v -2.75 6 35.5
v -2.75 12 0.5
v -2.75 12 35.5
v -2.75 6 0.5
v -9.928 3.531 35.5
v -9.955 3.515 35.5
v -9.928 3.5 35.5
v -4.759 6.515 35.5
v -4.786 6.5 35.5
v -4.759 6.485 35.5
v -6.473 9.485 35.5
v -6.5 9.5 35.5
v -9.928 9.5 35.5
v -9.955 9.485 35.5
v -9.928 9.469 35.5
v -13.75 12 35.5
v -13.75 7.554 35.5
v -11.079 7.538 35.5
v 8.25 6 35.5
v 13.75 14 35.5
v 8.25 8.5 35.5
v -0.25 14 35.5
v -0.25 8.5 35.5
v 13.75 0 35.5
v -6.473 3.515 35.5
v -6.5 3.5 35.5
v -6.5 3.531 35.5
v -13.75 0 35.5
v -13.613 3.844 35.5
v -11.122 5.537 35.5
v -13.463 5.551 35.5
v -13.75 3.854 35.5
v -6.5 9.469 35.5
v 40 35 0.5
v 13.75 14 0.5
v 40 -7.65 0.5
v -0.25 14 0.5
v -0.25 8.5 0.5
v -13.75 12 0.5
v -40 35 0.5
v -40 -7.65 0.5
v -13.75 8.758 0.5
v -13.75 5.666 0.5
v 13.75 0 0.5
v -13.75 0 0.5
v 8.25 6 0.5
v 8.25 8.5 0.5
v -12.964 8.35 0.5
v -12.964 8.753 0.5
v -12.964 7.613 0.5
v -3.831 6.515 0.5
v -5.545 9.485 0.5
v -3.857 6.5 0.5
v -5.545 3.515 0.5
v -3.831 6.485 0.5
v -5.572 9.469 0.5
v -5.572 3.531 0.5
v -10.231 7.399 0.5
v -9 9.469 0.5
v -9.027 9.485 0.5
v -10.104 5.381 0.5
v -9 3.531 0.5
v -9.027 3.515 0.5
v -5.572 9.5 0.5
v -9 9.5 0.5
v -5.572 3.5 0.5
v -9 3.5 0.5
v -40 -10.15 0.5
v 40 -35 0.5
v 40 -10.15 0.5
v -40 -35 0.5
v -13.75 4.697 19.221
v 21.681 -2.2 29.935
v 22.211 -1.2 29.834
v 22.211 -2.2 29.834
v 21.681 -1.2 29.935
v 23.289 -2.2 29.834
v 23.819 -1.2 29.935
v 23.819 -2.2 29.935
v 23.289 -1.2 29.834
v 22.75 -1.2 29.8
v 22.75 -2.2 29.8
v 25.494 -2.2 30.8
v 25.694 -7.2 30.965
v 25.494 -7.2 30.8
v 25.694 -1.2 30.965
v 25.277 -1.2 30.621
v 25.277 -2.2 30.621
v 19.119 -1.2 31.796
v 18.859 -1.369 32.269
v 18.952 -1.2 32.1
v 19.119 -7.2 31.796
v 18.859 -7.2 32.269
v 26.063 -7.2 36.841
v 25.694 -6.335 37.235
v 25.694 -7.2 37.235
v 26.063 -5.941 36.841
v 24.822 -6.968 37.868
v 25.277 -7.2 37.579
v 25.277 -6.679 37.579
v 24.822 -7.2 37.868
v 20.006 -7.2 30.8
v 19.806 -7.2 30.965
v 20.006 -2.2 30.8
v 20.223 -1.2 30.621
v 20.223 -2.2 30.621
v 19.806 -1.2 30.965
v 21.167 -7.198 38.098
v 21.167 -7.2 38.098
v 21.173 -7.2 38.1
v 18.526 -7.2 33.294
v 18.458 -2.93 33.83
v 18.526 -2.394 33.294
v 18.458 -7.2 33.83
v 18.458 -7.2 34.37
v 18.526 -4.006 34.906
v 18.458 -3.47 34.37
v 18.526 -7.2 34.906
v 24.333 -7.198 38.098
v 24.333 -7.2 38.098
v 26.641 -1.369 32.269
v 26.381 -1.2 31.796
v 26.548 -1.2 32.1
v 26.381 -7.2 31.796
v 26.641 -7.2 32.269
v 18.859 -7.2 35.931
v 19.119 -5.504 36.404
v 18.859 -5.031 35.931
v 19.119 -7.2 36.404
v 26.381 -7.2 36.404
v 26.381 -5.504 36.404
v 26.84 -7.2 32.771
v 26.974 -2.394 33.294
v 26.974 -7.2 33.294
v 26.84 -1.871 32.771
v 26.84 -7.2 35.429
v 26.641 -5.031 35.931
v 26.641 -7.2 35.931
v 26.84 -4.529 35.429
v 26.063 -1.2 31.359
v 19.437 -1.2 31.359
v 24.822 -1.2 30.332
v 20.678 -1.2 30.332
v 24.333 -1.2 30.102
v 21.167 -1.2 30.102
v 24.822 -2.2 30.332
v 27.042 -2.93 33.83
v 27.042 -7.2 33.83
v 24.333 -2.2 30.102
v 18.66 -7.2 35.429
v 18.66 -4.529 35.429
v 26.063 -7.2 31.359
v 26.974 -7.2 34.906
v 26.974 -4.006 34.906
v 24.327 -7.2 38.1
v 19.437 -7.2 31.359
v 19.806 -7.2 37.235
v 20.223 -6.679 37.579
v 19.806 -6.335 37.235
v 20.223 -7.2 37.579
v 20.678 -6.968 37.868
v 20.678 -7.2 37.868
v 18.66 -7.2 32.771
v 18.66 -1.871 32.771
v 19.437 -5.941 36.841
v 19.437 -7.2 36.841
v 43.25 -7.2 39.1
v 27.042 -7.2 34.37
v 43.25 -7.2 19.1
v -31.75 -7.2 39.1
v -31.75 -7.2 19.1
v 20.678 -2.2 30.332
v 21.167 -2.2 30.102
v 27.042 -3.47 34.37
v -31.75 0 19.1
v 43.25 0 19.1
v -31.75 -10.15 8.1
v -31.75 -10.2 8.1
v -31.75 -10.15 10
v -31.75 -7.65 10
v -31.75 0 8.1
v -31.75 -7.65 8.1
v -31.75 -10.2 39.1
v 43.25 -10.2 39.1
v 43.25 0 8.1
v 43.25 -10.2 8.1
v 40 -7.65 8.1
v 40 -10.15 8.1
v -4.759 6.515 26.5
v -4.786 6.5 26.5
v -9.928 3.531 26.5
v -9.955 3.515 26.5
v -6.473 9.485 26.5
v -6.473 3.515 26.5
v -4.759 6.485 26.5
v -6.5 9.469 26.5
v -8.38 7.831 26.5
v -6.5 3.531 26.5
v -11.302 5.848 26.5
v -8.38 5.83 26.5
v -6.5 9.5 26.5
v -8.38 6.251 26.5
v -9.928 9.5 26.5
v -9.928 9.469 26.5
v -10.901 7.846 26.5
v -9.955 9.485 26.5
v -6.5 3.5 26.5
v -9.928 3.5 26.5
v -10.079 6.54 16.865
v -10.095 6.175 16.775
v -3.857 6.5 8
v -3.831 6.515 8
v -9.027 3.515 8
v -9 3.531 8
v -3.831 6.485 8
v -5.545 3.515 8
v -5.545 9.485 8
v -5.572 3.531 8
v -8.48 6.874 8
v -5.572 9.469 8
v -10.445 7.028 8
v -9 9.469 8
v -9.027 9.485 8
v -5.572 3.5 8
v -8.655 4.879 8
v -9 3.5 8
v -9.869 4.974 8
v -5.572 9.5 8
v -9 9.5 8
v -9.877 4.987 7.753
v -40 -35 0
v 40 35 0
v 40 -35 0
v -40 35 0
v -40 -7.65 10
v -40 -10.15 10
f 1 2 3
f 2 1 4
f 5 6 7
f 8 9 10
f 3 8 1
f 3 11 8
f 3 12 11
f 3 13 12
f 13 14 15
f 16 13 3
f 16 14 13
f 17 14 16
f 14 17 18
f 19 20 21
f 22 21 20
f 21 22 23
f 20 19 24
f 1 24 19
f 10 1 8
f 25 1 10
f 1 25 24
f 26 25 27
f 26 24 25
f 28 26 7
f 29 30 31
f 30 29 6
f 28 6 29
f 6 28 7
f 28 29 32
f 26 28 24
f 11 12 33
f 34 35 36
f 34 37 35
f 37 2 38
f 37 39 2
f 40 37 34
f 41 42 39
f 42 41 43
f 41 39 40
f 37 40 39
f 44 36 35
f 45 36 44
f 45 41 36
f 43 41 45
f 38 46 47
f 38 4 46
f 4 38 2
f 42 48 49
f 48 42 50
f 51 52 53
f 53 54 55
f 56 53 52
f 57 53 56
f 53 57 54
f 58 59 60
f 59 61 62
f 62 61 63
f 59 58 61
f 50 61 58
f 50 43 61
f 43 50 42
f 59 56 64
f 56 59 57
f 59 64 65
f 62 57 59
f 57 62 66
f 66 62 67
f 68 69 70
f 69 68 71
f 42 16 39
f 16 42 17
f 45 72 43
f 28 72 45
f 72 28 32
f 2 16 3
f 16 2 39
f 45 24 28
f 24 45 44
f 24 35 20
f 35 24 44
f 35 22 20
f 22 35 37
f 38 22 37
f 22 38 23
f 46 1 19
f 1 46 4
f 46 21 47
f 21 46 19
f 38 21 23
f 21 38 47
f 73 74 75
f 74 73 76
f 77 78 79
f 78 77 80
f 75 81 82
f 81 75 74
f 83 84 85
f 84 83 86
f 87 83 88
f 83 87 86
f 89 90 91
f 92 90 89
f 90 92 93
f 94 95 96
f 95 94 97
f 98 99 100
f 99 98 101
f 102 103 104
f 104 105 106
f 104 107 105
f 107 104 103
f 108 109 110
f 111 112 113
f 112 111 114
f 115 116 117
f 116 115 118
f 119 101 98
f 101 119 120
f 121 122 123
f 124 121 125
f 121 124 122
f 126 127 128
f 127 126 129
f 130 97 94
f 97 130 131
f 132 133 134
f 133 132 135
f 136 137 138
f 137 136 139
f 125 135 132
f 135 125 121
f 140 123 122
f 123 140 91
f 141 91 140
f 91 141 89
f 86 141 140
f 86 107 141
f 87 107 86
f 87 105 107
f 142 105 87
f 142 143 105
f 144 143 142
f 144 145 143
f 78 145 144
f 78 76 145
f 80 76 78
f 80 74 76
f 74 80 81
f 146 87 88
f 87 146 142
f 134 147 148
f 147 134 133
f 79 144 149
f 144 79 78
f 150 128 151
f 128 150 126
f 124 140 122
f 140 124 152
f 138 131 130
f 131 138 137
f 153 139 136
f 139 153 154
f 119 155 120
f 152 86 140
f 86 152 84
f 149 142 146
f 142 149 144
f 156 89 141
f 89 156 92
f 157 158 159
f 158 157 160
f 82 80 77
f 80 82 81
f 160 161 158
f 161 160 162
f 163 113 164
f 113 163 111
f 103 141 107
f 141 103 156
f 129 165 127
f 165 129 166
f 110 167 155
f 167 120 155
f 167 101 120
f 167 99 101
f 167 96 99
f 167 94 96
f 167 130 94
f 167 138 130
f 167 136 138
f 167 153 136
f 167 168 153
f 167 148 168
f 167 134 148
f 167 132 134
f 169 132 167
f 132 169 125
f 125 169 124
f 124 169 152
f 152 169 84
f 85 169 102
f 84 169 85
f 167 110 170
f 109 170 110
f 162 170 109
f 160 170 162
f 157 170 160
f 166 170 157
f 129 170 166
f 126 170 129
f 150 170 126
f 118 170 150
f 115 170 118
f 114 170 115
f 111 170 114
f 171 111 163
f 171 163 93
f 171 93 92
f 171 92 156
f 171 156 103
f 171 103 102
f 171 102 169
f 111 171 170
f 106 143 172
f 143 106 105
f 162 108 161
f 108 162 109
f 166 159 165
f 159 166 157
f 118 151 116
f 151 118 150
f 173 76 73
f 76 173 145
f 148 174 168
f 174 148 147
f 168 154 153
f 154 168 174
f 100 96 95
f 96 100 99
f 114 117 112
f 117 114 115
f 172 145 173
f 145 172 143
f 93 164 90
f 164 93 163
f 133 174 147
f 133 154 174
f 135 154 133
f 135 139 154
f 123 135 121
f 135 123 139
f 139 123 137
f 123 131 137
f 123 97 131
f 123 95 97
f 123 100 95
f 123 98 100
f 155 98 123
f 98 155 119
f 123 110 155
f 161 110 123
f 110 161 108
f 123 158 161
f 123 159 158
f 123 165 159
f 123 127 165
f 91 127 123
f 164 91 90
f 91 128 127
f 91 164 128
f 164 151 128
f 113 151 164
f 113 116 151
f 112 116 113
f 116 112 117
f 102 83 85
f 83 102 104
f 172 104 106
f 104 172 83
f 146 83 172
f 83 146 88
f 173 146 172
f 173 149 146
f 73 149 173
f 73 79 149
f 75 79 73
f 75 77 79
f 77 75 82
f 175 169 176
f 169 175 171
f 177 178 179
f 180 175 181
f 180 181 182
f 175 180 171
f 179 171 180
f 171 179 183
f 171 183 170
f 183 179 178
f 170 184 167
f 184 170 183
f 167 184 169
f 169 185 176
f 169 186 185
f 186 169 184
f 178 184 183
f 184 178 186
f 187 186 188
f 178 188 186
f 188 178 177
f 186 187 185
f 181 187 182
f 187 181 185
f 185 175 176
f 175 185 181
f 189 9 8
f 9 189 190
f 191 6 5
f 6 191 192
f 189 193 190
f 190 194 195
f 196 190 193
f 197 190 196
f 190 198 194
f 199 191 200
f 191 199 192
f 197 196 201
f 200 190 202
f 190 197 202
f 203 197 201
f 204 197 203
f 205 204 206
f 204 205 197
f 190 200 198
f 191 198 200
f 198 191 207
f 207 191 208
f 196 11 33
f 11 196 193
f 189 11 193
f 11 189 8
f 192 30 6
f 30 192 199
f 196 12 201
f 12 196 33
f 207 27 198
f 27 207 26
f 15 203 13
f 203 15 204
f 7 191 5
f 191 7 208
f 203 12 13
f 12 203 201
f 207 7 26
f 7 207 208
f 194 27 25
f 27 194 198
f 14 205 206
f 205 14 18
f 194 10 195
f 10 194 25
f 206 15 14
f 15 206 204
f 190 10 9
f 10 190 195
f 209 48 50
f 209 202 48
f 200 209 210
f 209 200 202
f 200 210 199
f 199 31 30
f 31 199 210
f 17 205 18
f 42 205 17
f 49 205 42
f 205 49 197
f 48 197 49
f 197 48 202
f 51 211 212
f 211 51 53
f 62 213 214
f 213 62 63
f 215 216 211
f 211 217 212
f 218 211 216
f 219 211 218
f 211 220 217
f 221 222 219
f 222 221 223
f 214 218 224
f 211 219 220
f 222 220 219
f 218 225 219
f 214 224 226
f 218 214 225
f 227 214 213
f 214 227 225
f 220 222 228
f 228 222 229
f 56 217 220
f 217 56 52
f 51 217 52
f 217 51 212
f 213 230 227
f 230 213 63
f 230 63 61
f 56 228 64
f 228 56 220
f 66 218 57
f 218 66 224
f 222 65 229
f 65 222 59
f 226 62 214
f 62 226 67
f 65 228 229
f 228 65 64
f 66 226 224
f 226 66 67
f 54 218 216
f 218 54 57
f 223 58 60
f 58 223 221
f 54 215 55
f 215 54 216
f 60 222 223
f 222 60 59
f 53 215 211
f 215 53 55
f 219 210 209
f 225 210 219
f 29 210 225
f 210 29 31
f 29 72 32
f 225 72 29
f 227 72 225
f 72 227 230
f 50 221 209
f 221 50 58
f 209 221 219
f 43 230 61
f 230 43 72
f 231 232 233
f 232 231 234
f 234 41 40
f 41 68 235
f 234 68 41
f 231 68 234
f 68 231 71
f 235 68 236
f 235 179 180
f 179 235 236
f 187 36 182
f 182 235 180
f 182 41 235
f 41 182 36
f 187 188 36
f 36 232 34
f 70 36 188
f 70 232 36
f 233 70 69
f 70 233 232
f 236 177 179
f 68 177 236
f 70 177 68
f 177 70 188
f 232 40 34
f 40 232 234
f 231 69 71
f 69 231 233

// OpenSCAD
use <MCAD/shapes.scad>;

$fn = 50;

width_cable = 11;
depth_cable = 12;

width = 27.5;
height = 35;

depth_hang = 14;

hole1_width = 10;

hole2_depth = 8;

hole_size = 2.5;

cube_hole1_width = 6*2/sqrt(3);
cube_hole1_depth = 6;
cube_hole1_height = 9;

hole1_distance_from_bottom = 5.5;

hole2_distance_width = 4;
hole2_distance_depth = 1.5;
hole2_distance_height = 1.5;

slit2_height = 47;
slit2_width = 7;
slit2_depth = 2;

slit1_height = 45;
slit1_width = 8;
slit1_depth = 2;

tube_height = 2.5;
tube_d = 7;
tube_spare = 3;

tube_distance_height = 3;

window_hook_d = 8.6;
window_hook_height = 6;
window_hook_angle = 45;

window_plate_depth = 3;
window_plate_height = 20;
window_plate_width = 75;

window_plate_cut_pos1 = 12;
window_plate_cut_pos2 = 31;

window_plate_cut_width = 2;

window_hook_pos_w = window_plate_width/2 - 20.5;
window_hook_pos_h = 15;

window_joint_depth = 7.2 + window_plate_depth;
window_joint_height = 11;
window_joint_width = window_plate_width;

window_pos = [15-6-(window_hook_pos_w - width/2), 0, height-window_joint_height-22+5.6];

module window_hook() {
    difference() {
        linear_extrude(height=window_hook_height)
        circle(d=window_hook_d);
        
        translate([0, 0, window_hook_height - 2])
        rotate([0, -window_hook_angle, 0])
        linear_extrude(height=window_hook_height)
        square(2 * window_hook_d, center=true);
    
        translate([window_hook_d - 1, 0, 0])
        linear_extrude(height=window_hook_height - 1)
        square(window_hook_d, center=true);
    }
}

module window_plate() {
    #linear_extrude(height=window_plate_height)
    //difference() {
        square([window_plate_width, window_plate_depth], center=true);
        //translate([(window_plate_width + window_plate_cut_width)/2 - window_plate_cut_pos1, 0])
        //square([window_plate_cut_width, window_plate_depth], center=true);
    
        //translate([(window_plate_width + window_plate_cut_width)/2 - window_plate_cut_pos2, 0])
        //square([window_plate_cut_width, window_plate_depth], center=true);
    //}
}

module window() {
    translate([window_hook_pos_w, window_plate_depth/2, window_hook_pos_h])
    rotate([-90, 90, 0])
    window_hook();
    
    window_plate();
    
    translate([0, (window_joint_depth - window_plate_depth)/2, -window_joint_height])
    linear_extrude(height=window_joint_height)
    square([window_joint_width, window_joint_depth], center=true);
}

translate([0, -8.9, 0])
linear_extrude(height=10)
square([80, 2.5], center=true);

linear_extrude(height=0.5)
square([80, 70], center=true);

translate([0,0,0.5])
difference() {
    union(){
        translate([-width/2, 0, 0])
        base_whole();
        translate(window_pos)
        translate([0, window_plate_depth/2 - window_joint_depth, window_joint_height])
        window();
    };
    translate([-width/2, 0, 0])
    union() {
        hole1();
        hole2();
    };
};
//linear_extrude(height=0.2)
//translate([-10, -20])
//square([50, 50]);

module slit2() {
    rotate([3, -10, -5])
    translate([-slit2_width/2, slit2_depth, 0])
    cube([slit2_width, slit2_depth, slit2_height]);
};

module tube() {
    translate([0, 0, (stick_height/2)-tube_distance_height])
    difference() {
        cylinder(r1=stick_d/2, r2=stick_d/2, h=tube_height, center=true);
        cylinder(r1=tube_d/2, r2=tube_d/2, h=tube_height, center=true);
        cube([stick_d, tube_height, stick_height], center=true);
    };
};

module slit1() {
    translate([1, (cube_hole1_depth-slit1_depth)/2, 10])
    rotate([2, 10, 0])
    translate([-slit1_width/2, 0, -slit1_height])
    cube([slit1_width, slit1_depth, slit1_height]);
};

module hole1() {
    translate([width_cable-cube_hole1_width-2 ,  hole1_distance_from_bottom-2, height-cube_hole1_height]) {
        //cube([cube_hole1_width, cube_hole1_depth, cube_hole1_height]);
        translate([(cube_hole1_depth)/sqrt(3), cube_hole1_depth/2, cube_hole1_height/2])
        hexagon(cube_hole1_depth, cube_hole1_height);
        slit1();
    };
};

module hole2() {
    translate([hole2_distance_width-1, hole2_distance_depth+2, hole2_distance_height-3])
    union() {
        translate([(cube_hole1_depth)/sqrt(3), cube_hole1_depth/2, cube_hole1_height/2])
        hexagon(cube_hole1_depth, cube_hole1_height);
        slit2();
    };
};

module base_whole() {
    difference() {
        base();
        union() {
            translate([width_cable, depth_hang-hole2_depth, 0])
            cube([hole_size, hole2_depth, height]);
            translate([width_cable, depth_hang-hole2_depth, 0])
            cube([hole1_width+1, hole_size, height]);
        };
    };
};


module base() {
    union() {
        cube([width_cable, depth_cable, height]);
        translate([width_cable, 0, 0])
        cube([width-width_cable, depth_hang, height]);
    };
};
